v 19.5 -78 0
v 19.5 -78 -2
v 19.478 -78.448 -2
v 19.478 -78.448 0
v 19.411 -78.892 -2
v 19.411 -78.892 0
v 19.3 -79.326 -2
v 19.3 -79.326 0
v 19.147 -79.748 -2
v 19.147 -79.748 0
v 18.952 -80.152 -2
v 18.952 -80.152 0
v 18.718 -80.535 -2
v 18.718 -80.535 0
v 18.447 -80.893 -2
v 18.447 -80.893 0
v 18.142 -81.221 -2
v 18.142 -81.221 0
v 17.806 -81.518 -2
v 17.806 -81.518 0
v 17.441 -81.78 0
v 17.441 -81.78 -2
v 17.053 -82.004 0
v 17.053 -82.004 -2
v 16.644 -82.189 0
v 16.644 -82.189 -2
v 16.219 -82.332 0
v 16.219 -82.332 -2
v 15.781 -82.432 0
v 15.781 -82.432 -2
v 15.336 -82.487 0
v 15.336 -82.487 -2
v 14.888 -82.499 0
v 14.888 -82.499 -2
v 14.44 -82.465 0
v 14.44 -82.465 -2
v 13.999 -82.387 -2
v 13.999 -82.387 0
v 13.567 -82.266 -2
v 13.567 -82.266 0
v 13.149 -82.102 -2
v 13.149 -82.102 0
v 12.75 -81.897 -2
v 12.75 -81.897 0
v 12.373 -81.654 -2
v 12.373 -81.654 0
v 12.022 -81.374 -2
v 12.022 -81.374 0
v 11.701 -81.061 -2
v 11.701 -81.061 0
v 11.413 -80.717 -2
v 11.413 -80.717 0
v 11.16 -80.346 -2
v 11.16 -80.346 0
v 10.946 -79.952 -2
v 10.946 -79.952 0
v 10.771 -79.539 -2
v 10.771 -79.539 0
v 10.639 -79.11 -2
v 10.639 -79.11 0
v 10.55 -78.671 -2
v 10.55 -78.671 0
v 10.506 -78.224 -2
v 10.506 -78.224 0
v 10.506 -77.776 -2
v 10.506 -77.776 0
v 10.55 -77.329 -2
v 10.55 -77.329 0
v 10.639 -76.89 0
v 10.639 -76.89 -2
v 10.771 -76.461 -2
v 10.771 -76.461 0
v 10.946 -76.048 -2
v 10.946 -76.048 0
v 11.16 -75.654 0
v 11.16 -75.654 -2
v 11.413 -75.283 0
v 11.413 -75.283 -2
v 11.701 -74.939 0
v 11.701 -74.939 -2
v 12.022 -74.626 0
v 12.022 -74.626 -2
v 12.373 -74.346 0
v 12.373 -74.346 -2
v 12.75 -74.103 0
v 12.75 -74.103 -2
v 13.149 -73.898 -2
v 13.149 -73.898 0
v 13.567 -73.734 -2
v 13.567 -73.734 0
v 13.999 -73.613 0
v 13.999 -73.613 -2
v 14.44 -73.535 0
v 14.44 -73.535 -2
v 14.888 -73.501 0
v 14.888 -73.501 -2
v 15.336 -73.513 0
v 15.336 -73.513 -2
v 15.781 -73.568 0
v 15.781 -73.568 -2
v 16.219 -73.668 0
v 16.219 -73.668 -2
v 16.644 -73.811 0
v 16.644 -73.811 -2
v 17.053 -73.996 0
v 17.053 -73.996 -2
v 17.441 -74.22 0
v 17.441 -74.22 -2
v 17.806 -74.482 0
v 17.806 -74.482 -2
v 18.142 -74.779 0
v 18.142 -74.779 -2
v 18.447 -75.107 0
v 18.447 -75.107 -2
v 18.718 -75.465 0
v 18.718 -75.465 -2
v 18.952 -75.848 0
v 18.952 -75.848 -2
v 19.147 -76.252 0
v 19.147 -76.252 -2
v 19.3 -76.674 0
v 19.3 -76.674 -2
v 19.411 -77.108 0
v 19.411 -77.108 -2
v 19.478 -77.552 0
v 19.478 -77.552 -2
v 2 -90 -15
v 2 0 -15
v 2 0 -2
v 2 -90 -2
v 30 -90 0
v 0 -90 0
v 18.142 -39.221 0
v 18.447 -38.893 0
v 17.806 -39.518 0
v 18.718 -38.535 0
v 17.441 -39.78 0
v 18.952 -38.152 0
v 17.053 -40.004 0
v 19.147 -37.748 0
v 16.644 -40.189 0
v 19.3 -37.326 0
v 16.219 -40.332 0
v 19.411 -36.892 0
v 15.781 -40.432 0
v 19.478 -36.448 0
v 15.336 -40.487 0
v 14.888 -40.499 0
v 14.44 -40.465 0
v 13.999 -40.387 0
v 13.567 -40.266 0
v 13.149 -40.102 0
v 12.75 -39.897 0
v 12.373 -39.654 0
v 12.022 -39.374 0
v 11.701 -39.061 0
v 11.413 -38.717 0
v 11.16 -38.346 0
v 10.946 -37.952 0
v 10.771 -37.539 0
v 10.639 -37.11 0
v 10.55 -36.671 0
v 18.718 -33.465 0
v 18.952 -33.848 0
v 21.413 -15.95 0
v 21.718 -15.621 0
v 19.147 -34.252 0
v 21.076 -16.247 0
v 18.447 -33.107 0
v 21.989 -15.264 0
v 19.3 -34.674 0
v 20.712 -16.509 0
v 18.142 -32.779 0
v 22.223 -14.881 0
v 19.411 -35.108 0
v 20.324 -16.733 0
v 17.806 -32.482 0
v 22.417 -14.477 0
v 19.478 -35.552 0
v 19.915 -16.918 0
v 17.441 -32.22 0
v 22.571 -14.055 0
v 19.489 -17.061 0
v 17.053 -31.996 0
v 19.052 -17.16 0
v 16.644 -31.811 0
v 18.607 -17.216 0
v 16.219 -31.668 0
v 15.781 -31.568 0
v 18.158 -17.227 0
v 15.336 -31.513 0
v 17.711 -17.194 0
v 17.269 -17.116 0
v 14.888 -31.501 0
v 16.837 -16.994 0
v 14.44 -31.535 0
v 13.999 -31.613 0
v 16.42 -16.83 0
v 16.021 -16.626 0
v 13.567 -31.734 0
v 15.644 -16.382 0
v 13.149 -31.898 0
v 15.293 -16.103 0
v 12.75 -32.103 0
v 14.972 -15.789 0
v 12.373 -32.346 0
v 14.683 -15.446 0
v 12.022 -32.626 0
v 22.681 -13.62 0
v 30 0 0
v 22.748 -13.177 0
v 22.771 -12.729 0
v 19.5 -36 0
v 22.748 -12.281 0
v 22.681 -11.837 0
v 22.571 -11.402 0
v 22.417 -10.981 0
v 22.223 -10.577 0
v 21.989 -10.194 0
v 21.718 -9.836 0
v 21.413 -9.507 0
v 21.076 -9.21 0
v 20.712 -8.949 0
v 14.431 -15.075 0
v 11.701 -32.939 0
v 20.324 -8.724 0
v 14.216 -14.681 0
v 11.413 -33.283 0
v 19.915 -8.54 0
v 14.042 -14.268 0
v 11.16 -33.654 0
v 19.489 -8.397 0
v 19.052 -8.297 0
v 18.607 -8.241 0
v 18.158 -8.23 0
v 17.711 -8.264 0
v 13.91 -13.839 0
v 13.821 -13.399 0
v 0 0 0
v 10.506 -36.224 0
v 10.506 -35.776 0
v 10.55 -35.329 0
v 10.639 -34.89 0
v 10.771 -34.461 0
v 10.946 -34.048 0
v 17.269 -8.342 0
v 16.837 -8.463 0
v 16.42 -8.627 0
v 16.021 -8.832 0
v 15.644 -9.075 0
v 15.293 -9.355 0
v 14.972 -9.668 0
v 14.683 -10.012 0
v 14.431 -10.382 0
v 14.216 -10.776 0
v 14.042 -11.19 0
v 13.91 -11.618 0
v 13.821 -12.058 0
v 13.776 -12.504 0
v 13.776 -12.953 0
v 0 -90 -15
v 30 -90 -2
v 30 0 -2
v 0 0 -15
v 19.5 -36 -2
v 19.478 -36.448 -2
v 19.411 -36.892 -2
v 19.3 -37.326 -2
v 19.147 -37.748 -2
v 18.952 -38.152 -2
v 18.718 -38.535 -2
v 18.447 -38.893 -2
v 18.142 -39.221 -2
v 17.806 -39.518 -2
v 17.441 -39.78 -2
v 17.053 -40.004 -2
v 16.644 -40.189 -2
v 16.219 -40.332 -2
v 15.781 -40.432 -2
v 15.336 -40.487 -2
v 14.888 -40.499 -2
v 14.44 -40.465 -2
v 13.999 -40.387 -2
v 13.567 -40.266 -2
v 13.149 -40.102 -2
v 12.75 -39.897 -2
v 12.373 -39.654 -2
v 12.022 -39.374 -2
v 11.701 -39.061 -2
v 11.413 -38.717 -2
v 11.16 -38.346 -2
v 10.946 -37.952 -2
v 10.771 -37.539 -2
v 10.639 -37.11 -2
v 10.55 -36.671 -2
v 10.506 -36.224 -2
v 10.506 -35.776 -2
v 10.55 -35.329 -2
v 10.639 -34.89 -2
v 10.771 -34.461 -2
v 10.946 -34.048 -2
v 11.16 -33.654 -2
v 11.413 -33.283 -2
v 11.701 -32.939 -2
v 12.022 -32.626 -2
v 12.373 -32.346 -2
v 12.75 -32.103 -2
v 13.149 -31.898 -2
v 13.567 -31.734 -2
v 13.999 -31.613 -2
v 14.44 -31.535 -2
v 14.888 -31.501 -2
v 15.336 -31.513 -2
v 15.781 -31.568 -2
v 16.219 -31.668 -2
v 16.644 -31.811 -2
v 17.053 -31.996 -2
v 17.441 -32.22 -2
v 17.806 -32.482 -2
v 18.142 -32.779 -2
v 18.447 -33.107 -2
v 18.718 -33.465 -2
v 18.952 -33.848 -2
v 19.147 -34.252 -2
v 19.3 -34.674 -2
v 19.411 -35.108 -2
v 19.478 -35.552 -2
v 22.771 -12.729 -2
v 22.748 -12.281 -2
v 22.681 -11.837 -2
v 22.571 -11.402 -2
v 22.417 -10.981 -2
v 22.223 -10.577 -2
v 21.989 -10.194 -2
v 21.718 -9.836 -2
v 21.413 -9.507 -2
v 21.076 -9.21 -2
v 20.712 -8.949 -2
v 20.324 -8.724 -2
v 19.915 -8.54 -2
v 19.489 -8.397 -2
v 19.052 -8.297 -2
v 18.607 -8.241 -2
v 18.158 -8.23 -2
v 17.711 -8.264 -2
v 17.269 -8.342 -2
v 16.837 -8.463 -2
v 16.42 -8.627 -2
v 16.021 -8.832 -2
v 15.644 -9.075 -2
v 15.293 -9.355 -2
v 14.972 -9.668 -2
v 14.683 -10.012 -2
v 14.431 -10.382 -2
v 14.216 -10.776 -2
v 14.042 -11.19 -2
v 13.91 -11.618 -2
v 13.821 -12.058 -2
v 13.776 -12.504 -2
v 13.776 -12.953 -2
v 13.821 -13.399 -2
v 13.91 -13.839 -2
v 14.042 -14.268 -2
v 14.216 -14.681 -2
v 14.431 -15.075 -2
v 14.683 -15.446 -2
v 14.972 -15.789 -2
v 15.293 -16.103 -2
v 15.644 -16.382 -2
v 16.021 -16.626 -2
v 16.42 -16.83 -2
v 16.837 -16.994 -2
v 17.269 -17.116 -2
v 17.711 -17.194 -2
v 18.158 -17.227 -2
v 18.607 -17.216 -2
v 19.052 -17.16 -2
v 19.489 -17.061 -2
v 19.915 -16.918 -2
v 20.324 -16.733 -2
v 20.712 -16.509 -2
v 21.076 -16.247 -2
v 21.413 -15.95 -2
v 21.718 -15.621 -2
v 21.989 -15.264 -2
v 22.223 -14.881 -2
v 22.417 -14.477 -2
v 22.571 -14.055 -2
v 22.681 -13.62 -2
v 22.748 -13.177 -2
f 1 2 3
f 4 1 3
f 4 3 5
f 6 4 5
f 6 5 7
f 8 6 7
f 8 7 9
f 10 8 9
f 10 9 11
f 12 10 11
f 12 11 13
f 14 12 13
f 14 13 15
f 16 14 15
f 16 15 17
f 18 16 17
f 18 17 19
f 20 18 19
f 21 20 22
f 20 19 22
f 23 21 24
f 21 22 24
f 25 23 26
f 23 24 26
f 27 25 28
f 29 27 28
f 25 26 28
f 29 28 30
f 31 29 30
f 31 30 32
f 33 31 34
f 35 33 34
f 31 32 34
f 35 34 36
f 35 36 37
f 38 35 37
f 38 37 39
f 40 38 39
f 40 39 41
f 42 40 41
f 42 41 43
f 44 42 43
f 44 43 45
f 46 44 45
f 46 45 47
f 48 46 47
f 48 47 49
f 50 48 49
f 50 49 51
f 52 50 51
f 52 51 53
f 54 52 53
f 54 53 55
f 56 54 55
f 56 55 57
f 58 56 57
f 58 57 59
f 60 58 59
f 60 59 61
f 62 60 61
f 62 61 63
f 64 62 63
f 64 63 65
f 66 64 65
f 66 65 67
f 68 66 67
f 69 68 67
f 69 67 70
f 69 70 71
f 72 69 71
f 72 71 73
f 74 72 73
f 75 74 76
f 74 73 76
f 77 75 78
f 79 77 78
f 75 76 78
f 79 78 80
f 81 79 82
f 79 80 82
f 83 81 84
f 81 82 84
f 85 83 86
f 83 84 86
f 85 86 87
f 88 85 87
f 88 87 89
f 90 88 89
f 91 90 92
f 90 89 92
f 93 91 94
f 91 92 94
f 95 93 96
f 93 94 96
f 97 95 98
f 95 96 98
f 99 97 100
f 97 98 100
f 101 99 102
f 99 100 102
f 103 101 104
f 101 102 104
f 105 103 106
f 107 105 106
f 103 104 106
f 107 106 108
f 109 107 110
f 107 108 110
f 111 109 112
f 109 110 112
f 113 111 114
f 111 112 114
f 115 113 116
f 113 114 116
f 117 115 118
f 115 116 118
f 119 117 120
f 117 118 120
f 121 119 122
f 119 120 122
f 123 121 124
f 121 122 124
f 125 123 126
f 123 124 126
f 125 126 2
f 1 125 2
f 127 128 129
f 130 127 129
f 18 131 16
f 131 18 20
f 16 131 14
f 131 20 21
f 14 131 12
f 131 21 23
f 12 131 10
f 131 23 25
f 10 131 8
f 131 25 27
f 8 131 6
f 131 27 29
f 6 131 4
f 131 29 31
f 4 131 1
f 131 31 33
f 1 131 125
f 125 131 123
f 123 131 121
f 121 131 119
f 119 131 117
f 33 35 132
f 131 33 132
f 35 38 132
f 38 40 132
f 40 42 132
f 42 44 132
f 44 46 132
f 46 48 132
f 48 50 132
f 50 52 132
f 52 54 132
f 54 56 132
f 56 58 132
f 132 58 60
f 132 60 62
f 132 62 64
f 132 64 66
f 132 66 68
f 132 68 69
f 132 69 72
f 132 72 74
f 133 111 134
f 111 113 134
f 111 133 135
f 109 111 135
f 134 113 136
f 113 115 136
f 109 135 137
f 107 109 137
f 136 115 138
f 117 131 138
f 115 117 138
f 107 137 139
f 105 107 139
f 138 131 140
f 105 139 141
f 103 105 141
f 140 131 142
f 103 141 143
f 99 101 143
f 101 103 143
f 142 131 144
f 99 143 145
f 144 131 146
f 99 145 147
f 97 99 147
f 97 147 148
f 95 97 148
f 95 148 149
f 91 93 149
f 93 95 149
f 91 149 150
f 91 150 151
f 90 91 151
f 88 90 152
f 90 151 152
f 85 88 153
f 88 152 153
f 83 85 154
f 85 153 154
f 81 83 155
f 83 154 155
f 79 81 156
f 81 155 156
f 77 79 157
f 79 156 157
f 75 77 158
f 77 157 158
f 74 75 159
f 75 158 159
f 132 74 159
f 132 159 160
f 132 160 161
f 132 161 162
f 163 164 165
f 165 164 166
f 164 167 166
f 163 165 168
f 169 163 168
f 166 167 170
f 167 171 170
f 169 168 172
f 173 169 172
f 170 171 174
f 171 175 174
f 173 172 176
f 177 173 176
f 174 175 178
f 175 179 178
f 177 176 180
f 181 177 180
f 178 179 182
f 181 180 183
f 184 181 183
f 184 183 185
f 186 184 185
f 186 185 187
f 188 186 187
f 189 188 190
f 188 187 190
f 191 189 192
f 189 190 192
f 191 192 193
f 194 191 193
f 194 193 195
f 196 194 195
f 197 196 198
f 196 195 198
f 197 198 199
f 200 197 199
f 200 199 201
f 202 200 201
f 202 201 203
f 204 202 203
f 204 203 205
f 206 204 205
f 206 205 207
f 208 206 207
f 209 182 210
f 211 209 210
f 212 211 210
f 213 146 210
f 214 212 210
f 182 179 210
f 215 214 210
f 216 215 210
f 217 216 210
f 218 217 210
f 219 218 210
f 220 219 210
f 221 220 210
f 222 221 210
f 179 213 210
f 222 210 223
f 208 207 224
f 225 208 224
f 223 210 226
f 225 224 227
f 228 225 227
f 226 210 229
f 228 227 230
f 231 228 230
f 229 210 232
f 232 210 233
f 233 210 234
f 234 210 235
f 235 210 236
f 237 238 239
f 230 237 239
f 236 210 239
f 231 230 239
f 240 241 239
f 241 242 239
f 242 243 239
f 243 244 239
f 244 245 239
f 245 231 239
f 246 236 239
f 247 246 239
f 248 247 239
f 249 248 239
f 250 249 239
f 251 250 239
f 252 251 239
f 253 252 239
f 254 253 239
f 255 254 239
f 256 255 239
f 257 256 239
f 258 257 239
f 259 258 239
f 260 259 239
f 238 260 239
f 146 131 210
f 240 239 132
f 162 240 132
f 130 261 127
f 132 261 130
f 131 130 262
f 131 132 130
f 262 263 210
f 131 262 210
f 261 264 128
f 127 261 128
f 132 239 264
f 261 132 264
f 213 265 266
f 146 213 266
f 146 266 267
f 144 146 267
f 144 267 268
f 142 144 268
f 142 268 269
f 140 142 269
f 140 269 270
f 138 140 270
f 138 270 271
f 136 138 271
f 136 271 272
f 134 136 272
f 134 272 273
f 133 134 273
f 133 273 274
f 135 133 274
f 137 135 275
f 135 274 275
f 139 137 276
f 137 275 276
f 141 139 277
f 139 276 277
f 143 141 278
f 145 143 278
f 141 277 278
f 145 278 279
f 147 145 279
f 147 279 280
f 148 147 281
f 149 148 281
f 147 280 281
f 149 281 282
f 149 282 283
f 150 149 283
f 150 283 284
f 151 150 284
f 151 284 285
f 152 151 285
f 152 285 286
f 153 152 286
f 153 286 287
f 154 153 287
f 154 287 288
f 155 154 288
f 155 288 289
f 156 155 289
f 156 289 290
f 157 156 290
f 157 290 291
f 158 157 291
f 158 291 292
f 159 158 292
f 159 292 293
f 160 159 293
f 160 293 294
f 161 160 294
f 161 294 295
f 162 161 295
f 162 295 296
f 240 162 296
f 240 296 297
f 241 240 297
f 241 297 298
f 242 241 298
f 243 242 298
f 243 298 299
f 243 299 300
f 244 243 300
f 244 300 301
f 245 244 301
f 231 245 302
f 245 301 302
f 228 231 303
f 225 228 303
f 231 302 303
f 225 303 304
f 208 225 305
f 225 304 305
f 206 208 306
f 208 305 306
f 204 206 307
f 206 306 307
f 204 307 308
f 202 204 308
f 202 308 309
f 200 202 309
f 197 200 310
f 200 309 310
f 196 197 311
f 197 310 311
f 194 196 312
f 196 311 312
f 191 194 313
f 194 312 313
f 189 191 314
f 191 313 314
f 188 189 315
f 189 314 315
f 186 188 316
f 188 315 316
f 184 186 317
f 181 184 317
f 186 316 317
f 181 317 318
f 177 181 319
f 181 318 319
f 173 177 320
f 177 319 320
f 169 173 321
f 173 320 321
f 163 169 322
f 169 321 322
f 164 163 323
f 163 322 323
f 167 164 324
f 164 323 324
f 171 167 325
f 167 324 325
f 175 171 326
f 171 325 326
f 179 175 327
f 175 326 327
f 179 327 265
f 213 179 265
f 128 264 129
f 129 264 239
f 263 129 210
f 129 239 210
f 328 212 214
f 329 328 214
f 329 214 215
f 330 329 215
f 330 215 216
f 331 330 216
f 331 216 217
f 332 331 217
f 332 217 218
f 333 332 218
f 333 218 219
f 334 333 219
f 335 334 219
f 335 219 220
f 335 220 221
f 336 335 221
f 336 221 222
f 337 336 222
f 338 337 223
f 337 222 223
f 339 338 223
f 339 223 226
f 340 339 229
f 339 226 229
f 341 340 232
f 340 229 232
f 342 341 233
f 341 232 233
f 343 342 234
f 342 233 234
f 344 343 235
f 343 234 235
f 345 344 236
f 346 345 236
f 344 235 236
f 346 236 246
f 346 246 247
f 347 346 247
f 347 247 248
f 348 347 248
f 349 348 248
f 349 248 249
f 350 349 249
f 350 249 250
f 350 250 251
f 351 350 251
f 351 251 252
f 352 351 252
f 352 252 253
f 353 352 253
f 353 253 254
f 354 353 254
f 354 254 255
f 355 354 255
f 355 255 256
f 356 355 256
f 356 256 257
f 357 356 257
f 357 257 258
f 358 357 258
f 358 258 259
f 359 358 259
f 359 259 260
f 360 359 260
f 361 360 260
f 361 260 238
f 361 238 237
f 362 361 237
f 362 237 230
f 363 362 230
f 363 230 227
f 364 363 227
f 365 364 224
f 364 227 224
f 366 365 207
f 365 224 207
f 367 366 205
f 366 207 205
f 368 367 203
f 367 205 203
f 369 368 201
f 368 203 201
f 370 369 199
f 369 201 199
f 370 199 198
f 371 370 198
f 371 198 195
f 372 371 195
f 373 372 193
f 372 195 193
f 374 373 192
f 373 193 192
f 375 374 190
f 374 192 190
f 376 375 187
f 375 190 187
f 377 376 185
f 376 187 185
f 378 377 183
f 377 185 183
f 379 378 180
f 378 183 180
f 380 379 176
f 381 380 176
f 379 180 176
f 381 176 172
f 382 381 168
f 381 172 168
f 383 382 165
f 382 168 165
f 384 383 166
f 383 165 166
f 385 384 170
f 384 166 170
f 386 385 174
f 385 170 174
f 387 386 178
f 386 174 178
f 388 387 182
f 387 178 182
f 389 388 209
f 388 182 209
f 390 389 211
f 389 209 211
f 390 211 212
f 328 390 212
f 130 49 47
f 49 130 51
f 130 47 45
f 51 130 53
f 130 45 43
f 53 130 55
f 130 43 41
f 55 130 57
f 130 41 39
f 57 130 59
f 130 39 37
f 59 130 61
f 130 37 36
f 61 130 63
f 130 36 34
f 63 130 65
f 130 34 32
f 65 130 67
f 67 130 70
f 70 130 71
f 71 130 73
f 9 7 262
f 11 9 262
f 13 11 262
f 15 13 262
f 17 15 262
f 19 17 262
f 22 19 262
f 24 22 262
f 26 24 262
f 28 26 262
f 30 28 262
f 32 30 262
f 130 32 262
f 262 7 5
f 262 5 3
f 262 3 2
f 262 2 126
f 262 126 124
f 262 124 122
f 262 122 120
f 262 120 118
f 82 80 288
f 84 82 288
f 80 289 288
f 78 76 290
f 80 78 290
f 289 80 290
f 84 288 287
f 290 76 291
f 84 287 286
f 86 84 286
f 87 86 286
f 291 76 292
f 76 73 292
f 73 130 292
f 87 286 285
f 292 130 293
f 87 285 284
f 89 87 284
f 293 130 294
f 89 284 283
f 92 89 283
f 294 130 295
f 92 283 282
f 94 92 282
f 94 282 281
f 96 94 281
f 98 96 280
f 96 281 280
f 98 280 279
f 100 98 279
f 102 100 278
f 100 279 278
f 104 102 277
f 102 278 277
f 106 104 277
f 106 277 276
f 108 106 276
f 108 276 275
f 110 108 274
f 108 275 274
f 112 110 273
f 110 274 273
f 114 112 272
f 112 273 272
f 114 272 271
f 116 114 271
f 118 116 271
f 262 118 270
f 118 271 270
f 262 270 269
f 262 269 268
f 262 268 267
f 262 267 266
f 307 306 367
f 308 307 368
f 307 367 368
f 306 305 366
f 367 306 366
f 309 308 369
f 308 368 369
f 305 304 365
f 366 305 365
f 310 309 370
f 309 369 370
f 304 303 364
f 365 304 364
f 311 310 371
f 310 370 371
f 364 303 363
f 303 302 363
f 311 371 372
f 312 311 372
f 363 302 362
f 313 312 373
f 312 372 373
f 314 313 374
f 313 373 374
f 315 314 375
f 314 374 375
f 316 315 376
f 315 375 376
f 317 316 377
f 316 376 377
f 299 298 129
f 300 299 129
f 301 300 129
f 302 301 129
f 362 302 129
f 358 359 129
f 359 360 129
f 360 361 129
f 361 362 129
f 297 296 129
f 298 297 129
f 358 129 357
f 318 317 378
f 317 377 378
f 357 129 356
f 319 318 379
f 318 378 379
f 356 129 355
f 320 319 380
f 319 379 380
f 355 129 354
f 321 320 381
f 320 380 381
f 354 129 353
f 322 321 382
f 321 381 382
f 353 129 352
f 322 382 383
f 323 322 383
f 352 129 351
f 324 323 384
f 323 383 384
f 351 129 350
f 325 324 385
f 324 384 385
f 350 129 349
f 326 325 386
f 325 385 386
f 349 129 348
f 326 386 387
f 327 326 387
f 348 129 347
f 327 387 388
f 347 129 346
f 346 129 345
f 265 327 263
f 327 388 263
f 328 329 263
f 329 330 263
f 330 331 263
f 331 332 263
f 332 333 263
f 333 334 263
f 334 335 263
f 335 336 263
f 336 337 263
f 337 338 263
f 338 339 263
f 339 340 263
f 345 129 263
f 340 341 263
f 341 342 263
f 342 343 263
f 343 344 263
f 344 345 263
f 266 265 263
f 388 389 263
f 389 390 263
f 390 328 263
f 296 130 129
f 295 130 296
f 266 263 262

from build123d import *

# Parameters (mm, degrees)
F1_DEPTH = 90
F2_R     = 4.5
F3_DEPTH = 2.001
F4_R     = 4.5
F5_DEPTH = 15.001


with BuildPart() as f1:
    # F0 (on Front) → F1 (new body)
    with BuildSketch(Plane.XZ):
        Polygon((0, 0), (0, -15), (2, -15), (2, -2), (30, -2), (30, 0), align=None)
    extrude(amount=F1_DEPTH)

    # F2 (on face) → F3 (cut, through all)
    with BuildSketch(Plane(origin=(0, 0, -2), x_dir=(1, 0, 0), z_dir=(0, 0, -1))):
        with Locations((15, 78)):
            Circle(F2_R)
        with Locations((15, 36)):
            Circle(F2_R)
    extrude(amount=-F3_DEPTH, mode=Mode.SUBTRACT)

    # F4 (on face) → F5 (cut, through all)
    with BuildSketch(Plane.XY):
        with Locations((18.270568, -12.7287)):
            Circle(F4_R)
    extrude(amount=-F5_DEPTH, mode=Mode.SUBTRACT)


solid = f1.part
